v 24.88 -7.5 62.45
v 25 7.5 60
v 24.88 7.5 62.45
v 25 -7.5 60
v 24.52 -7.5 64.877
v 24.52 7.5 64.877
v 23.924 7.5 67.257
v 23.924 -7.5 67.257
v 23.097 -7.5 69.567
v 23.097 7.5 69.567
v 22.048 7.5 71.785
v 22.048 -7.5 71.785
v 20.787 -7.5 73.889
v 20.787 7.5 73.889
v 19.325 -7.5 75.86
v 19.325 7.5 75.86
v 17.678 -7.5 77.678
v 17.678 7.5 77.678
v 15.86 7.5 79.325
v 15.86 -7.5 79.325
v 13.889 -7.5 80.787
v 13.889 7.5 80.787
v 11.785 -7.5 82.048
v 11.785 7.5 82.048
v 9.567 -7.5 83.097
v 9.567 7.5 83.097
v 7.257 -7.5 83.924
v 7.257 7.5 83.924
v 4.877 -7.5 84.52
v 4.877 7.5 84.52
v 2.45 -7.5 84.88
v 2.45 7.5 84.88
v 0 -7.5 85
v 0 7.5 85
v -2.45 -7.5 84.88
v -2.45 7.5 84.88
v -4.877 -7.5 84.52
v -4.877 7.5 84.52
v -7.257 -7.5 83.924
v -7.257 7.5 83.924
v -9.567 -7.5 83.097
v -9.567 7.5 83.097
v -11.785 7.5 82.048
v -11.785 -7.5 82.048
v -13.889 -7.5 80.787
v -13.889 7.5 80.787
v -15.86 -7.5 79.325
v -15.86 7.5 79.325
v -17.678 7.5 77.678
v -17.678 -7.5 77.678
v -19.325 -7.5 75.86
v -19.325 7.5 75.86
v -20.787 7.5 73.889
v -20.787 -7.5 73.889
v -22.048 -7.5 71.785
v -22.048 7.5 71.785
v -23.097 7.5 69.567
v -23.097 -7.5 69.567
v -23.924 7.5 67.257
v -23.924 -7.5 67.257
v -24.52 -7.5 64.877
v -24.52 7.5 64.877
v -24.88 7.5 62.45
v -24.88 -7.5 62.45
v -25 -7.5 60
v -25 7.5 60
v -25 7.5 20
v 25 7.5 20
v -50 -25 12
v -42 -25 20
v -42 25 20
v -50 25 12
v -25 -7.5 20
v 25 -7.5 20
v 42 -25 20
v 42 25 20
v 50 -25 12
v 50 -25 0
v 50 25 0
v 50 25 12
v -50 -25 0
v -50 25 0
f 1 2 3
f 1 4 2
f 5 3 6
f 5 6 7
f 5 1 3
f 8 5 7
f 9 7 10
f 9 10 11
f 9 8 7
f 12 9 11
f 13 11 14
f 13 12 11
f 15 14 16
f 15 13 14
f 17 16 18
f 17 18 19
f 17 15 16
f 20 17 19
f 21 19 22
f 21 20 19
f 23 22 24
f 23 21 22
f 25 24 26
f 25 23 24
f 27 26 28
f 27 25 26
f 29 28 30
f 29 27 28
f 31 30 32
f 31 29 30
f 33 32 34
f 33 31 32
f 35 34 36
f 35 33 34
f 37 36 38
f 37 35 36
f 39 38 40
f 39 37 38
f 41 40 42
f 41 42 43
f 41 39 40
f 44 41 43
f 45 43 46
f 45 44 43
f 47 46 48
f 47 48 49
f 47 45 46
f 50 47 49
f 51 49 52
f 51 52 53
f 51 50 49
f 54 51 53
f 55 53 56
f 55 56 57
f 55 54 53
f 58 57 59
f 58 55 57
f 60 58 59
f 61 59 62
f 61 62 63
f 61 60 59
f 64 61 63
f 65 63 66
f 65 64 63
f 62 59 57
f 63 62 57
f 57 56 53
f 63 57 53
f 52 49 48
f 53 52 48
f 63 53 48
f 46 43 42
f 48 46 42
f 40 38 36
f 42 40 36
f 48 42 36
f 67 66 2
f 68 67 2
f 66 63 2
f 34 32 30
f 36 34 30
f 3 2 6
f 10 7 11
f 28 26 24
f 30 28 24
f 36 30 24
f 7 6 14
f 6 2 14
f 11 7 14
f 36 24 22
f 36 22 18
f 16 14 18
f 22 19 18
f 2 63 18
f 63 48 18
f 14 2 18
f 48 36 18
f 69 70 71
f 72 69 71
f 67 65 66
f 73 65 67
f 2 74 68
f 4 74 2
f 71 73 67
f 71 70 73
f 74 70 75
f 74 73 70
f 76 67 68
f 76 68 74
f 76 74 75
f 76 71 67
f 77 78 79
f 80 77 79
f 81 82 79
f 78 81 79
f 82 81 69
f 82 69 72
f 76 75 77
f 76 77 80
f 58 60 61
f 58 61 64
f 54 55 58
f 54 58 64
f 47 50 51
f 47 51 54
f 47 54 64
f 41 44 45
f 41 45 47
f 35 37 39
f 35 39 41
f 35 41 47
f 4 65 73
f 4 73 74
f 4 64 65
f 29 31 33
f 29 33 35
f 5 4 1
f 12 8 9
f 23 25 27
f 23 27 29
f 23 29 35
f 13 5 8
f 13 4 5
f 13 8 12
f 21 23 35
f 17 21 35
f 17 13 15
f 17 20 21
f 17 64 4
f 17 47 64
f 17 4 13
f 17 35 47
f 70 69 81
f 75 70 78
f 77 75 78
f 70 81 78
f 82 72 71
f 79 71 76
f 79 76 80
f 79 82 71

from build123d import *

# Parameters (mm, degrees)
F0_W     = 100
F0_H     = 50
F1_DEPTH = 20
F2_SIZE  = 8
F4_DEPTH = 7.5


with BuildPart() as f1:
    # F0 (on Top) → F1 (new body)
    with BuildSketch(Plane.XY):
        Rectangle(F0_W, F0_H)
    extrude(amount=F1_DEPTH)

    # F2
    f2_edges = [f1.edges().sort_by_distance(p)[0] for p in [
        (-50, 0, 20),
        (50, 0, 20),
    ]]
    chamfer(f2_edges, length=F2_SIZE)

    # F3 (on Front) → F4 (join, symmetric)
    with BuildSketch(Plane.XZ):
        with BuildLine():
            Line((-25, 60), (-25, 20))
            Line((-25, 20), (25, 20))
            Line((25, 20), (25, 60))
            ThreePointArc((25, 60), (0, 85), (-25, 60))
        make_face()
    extrude(amount=F4_DEPTH, both=True)


solid = f1.part
